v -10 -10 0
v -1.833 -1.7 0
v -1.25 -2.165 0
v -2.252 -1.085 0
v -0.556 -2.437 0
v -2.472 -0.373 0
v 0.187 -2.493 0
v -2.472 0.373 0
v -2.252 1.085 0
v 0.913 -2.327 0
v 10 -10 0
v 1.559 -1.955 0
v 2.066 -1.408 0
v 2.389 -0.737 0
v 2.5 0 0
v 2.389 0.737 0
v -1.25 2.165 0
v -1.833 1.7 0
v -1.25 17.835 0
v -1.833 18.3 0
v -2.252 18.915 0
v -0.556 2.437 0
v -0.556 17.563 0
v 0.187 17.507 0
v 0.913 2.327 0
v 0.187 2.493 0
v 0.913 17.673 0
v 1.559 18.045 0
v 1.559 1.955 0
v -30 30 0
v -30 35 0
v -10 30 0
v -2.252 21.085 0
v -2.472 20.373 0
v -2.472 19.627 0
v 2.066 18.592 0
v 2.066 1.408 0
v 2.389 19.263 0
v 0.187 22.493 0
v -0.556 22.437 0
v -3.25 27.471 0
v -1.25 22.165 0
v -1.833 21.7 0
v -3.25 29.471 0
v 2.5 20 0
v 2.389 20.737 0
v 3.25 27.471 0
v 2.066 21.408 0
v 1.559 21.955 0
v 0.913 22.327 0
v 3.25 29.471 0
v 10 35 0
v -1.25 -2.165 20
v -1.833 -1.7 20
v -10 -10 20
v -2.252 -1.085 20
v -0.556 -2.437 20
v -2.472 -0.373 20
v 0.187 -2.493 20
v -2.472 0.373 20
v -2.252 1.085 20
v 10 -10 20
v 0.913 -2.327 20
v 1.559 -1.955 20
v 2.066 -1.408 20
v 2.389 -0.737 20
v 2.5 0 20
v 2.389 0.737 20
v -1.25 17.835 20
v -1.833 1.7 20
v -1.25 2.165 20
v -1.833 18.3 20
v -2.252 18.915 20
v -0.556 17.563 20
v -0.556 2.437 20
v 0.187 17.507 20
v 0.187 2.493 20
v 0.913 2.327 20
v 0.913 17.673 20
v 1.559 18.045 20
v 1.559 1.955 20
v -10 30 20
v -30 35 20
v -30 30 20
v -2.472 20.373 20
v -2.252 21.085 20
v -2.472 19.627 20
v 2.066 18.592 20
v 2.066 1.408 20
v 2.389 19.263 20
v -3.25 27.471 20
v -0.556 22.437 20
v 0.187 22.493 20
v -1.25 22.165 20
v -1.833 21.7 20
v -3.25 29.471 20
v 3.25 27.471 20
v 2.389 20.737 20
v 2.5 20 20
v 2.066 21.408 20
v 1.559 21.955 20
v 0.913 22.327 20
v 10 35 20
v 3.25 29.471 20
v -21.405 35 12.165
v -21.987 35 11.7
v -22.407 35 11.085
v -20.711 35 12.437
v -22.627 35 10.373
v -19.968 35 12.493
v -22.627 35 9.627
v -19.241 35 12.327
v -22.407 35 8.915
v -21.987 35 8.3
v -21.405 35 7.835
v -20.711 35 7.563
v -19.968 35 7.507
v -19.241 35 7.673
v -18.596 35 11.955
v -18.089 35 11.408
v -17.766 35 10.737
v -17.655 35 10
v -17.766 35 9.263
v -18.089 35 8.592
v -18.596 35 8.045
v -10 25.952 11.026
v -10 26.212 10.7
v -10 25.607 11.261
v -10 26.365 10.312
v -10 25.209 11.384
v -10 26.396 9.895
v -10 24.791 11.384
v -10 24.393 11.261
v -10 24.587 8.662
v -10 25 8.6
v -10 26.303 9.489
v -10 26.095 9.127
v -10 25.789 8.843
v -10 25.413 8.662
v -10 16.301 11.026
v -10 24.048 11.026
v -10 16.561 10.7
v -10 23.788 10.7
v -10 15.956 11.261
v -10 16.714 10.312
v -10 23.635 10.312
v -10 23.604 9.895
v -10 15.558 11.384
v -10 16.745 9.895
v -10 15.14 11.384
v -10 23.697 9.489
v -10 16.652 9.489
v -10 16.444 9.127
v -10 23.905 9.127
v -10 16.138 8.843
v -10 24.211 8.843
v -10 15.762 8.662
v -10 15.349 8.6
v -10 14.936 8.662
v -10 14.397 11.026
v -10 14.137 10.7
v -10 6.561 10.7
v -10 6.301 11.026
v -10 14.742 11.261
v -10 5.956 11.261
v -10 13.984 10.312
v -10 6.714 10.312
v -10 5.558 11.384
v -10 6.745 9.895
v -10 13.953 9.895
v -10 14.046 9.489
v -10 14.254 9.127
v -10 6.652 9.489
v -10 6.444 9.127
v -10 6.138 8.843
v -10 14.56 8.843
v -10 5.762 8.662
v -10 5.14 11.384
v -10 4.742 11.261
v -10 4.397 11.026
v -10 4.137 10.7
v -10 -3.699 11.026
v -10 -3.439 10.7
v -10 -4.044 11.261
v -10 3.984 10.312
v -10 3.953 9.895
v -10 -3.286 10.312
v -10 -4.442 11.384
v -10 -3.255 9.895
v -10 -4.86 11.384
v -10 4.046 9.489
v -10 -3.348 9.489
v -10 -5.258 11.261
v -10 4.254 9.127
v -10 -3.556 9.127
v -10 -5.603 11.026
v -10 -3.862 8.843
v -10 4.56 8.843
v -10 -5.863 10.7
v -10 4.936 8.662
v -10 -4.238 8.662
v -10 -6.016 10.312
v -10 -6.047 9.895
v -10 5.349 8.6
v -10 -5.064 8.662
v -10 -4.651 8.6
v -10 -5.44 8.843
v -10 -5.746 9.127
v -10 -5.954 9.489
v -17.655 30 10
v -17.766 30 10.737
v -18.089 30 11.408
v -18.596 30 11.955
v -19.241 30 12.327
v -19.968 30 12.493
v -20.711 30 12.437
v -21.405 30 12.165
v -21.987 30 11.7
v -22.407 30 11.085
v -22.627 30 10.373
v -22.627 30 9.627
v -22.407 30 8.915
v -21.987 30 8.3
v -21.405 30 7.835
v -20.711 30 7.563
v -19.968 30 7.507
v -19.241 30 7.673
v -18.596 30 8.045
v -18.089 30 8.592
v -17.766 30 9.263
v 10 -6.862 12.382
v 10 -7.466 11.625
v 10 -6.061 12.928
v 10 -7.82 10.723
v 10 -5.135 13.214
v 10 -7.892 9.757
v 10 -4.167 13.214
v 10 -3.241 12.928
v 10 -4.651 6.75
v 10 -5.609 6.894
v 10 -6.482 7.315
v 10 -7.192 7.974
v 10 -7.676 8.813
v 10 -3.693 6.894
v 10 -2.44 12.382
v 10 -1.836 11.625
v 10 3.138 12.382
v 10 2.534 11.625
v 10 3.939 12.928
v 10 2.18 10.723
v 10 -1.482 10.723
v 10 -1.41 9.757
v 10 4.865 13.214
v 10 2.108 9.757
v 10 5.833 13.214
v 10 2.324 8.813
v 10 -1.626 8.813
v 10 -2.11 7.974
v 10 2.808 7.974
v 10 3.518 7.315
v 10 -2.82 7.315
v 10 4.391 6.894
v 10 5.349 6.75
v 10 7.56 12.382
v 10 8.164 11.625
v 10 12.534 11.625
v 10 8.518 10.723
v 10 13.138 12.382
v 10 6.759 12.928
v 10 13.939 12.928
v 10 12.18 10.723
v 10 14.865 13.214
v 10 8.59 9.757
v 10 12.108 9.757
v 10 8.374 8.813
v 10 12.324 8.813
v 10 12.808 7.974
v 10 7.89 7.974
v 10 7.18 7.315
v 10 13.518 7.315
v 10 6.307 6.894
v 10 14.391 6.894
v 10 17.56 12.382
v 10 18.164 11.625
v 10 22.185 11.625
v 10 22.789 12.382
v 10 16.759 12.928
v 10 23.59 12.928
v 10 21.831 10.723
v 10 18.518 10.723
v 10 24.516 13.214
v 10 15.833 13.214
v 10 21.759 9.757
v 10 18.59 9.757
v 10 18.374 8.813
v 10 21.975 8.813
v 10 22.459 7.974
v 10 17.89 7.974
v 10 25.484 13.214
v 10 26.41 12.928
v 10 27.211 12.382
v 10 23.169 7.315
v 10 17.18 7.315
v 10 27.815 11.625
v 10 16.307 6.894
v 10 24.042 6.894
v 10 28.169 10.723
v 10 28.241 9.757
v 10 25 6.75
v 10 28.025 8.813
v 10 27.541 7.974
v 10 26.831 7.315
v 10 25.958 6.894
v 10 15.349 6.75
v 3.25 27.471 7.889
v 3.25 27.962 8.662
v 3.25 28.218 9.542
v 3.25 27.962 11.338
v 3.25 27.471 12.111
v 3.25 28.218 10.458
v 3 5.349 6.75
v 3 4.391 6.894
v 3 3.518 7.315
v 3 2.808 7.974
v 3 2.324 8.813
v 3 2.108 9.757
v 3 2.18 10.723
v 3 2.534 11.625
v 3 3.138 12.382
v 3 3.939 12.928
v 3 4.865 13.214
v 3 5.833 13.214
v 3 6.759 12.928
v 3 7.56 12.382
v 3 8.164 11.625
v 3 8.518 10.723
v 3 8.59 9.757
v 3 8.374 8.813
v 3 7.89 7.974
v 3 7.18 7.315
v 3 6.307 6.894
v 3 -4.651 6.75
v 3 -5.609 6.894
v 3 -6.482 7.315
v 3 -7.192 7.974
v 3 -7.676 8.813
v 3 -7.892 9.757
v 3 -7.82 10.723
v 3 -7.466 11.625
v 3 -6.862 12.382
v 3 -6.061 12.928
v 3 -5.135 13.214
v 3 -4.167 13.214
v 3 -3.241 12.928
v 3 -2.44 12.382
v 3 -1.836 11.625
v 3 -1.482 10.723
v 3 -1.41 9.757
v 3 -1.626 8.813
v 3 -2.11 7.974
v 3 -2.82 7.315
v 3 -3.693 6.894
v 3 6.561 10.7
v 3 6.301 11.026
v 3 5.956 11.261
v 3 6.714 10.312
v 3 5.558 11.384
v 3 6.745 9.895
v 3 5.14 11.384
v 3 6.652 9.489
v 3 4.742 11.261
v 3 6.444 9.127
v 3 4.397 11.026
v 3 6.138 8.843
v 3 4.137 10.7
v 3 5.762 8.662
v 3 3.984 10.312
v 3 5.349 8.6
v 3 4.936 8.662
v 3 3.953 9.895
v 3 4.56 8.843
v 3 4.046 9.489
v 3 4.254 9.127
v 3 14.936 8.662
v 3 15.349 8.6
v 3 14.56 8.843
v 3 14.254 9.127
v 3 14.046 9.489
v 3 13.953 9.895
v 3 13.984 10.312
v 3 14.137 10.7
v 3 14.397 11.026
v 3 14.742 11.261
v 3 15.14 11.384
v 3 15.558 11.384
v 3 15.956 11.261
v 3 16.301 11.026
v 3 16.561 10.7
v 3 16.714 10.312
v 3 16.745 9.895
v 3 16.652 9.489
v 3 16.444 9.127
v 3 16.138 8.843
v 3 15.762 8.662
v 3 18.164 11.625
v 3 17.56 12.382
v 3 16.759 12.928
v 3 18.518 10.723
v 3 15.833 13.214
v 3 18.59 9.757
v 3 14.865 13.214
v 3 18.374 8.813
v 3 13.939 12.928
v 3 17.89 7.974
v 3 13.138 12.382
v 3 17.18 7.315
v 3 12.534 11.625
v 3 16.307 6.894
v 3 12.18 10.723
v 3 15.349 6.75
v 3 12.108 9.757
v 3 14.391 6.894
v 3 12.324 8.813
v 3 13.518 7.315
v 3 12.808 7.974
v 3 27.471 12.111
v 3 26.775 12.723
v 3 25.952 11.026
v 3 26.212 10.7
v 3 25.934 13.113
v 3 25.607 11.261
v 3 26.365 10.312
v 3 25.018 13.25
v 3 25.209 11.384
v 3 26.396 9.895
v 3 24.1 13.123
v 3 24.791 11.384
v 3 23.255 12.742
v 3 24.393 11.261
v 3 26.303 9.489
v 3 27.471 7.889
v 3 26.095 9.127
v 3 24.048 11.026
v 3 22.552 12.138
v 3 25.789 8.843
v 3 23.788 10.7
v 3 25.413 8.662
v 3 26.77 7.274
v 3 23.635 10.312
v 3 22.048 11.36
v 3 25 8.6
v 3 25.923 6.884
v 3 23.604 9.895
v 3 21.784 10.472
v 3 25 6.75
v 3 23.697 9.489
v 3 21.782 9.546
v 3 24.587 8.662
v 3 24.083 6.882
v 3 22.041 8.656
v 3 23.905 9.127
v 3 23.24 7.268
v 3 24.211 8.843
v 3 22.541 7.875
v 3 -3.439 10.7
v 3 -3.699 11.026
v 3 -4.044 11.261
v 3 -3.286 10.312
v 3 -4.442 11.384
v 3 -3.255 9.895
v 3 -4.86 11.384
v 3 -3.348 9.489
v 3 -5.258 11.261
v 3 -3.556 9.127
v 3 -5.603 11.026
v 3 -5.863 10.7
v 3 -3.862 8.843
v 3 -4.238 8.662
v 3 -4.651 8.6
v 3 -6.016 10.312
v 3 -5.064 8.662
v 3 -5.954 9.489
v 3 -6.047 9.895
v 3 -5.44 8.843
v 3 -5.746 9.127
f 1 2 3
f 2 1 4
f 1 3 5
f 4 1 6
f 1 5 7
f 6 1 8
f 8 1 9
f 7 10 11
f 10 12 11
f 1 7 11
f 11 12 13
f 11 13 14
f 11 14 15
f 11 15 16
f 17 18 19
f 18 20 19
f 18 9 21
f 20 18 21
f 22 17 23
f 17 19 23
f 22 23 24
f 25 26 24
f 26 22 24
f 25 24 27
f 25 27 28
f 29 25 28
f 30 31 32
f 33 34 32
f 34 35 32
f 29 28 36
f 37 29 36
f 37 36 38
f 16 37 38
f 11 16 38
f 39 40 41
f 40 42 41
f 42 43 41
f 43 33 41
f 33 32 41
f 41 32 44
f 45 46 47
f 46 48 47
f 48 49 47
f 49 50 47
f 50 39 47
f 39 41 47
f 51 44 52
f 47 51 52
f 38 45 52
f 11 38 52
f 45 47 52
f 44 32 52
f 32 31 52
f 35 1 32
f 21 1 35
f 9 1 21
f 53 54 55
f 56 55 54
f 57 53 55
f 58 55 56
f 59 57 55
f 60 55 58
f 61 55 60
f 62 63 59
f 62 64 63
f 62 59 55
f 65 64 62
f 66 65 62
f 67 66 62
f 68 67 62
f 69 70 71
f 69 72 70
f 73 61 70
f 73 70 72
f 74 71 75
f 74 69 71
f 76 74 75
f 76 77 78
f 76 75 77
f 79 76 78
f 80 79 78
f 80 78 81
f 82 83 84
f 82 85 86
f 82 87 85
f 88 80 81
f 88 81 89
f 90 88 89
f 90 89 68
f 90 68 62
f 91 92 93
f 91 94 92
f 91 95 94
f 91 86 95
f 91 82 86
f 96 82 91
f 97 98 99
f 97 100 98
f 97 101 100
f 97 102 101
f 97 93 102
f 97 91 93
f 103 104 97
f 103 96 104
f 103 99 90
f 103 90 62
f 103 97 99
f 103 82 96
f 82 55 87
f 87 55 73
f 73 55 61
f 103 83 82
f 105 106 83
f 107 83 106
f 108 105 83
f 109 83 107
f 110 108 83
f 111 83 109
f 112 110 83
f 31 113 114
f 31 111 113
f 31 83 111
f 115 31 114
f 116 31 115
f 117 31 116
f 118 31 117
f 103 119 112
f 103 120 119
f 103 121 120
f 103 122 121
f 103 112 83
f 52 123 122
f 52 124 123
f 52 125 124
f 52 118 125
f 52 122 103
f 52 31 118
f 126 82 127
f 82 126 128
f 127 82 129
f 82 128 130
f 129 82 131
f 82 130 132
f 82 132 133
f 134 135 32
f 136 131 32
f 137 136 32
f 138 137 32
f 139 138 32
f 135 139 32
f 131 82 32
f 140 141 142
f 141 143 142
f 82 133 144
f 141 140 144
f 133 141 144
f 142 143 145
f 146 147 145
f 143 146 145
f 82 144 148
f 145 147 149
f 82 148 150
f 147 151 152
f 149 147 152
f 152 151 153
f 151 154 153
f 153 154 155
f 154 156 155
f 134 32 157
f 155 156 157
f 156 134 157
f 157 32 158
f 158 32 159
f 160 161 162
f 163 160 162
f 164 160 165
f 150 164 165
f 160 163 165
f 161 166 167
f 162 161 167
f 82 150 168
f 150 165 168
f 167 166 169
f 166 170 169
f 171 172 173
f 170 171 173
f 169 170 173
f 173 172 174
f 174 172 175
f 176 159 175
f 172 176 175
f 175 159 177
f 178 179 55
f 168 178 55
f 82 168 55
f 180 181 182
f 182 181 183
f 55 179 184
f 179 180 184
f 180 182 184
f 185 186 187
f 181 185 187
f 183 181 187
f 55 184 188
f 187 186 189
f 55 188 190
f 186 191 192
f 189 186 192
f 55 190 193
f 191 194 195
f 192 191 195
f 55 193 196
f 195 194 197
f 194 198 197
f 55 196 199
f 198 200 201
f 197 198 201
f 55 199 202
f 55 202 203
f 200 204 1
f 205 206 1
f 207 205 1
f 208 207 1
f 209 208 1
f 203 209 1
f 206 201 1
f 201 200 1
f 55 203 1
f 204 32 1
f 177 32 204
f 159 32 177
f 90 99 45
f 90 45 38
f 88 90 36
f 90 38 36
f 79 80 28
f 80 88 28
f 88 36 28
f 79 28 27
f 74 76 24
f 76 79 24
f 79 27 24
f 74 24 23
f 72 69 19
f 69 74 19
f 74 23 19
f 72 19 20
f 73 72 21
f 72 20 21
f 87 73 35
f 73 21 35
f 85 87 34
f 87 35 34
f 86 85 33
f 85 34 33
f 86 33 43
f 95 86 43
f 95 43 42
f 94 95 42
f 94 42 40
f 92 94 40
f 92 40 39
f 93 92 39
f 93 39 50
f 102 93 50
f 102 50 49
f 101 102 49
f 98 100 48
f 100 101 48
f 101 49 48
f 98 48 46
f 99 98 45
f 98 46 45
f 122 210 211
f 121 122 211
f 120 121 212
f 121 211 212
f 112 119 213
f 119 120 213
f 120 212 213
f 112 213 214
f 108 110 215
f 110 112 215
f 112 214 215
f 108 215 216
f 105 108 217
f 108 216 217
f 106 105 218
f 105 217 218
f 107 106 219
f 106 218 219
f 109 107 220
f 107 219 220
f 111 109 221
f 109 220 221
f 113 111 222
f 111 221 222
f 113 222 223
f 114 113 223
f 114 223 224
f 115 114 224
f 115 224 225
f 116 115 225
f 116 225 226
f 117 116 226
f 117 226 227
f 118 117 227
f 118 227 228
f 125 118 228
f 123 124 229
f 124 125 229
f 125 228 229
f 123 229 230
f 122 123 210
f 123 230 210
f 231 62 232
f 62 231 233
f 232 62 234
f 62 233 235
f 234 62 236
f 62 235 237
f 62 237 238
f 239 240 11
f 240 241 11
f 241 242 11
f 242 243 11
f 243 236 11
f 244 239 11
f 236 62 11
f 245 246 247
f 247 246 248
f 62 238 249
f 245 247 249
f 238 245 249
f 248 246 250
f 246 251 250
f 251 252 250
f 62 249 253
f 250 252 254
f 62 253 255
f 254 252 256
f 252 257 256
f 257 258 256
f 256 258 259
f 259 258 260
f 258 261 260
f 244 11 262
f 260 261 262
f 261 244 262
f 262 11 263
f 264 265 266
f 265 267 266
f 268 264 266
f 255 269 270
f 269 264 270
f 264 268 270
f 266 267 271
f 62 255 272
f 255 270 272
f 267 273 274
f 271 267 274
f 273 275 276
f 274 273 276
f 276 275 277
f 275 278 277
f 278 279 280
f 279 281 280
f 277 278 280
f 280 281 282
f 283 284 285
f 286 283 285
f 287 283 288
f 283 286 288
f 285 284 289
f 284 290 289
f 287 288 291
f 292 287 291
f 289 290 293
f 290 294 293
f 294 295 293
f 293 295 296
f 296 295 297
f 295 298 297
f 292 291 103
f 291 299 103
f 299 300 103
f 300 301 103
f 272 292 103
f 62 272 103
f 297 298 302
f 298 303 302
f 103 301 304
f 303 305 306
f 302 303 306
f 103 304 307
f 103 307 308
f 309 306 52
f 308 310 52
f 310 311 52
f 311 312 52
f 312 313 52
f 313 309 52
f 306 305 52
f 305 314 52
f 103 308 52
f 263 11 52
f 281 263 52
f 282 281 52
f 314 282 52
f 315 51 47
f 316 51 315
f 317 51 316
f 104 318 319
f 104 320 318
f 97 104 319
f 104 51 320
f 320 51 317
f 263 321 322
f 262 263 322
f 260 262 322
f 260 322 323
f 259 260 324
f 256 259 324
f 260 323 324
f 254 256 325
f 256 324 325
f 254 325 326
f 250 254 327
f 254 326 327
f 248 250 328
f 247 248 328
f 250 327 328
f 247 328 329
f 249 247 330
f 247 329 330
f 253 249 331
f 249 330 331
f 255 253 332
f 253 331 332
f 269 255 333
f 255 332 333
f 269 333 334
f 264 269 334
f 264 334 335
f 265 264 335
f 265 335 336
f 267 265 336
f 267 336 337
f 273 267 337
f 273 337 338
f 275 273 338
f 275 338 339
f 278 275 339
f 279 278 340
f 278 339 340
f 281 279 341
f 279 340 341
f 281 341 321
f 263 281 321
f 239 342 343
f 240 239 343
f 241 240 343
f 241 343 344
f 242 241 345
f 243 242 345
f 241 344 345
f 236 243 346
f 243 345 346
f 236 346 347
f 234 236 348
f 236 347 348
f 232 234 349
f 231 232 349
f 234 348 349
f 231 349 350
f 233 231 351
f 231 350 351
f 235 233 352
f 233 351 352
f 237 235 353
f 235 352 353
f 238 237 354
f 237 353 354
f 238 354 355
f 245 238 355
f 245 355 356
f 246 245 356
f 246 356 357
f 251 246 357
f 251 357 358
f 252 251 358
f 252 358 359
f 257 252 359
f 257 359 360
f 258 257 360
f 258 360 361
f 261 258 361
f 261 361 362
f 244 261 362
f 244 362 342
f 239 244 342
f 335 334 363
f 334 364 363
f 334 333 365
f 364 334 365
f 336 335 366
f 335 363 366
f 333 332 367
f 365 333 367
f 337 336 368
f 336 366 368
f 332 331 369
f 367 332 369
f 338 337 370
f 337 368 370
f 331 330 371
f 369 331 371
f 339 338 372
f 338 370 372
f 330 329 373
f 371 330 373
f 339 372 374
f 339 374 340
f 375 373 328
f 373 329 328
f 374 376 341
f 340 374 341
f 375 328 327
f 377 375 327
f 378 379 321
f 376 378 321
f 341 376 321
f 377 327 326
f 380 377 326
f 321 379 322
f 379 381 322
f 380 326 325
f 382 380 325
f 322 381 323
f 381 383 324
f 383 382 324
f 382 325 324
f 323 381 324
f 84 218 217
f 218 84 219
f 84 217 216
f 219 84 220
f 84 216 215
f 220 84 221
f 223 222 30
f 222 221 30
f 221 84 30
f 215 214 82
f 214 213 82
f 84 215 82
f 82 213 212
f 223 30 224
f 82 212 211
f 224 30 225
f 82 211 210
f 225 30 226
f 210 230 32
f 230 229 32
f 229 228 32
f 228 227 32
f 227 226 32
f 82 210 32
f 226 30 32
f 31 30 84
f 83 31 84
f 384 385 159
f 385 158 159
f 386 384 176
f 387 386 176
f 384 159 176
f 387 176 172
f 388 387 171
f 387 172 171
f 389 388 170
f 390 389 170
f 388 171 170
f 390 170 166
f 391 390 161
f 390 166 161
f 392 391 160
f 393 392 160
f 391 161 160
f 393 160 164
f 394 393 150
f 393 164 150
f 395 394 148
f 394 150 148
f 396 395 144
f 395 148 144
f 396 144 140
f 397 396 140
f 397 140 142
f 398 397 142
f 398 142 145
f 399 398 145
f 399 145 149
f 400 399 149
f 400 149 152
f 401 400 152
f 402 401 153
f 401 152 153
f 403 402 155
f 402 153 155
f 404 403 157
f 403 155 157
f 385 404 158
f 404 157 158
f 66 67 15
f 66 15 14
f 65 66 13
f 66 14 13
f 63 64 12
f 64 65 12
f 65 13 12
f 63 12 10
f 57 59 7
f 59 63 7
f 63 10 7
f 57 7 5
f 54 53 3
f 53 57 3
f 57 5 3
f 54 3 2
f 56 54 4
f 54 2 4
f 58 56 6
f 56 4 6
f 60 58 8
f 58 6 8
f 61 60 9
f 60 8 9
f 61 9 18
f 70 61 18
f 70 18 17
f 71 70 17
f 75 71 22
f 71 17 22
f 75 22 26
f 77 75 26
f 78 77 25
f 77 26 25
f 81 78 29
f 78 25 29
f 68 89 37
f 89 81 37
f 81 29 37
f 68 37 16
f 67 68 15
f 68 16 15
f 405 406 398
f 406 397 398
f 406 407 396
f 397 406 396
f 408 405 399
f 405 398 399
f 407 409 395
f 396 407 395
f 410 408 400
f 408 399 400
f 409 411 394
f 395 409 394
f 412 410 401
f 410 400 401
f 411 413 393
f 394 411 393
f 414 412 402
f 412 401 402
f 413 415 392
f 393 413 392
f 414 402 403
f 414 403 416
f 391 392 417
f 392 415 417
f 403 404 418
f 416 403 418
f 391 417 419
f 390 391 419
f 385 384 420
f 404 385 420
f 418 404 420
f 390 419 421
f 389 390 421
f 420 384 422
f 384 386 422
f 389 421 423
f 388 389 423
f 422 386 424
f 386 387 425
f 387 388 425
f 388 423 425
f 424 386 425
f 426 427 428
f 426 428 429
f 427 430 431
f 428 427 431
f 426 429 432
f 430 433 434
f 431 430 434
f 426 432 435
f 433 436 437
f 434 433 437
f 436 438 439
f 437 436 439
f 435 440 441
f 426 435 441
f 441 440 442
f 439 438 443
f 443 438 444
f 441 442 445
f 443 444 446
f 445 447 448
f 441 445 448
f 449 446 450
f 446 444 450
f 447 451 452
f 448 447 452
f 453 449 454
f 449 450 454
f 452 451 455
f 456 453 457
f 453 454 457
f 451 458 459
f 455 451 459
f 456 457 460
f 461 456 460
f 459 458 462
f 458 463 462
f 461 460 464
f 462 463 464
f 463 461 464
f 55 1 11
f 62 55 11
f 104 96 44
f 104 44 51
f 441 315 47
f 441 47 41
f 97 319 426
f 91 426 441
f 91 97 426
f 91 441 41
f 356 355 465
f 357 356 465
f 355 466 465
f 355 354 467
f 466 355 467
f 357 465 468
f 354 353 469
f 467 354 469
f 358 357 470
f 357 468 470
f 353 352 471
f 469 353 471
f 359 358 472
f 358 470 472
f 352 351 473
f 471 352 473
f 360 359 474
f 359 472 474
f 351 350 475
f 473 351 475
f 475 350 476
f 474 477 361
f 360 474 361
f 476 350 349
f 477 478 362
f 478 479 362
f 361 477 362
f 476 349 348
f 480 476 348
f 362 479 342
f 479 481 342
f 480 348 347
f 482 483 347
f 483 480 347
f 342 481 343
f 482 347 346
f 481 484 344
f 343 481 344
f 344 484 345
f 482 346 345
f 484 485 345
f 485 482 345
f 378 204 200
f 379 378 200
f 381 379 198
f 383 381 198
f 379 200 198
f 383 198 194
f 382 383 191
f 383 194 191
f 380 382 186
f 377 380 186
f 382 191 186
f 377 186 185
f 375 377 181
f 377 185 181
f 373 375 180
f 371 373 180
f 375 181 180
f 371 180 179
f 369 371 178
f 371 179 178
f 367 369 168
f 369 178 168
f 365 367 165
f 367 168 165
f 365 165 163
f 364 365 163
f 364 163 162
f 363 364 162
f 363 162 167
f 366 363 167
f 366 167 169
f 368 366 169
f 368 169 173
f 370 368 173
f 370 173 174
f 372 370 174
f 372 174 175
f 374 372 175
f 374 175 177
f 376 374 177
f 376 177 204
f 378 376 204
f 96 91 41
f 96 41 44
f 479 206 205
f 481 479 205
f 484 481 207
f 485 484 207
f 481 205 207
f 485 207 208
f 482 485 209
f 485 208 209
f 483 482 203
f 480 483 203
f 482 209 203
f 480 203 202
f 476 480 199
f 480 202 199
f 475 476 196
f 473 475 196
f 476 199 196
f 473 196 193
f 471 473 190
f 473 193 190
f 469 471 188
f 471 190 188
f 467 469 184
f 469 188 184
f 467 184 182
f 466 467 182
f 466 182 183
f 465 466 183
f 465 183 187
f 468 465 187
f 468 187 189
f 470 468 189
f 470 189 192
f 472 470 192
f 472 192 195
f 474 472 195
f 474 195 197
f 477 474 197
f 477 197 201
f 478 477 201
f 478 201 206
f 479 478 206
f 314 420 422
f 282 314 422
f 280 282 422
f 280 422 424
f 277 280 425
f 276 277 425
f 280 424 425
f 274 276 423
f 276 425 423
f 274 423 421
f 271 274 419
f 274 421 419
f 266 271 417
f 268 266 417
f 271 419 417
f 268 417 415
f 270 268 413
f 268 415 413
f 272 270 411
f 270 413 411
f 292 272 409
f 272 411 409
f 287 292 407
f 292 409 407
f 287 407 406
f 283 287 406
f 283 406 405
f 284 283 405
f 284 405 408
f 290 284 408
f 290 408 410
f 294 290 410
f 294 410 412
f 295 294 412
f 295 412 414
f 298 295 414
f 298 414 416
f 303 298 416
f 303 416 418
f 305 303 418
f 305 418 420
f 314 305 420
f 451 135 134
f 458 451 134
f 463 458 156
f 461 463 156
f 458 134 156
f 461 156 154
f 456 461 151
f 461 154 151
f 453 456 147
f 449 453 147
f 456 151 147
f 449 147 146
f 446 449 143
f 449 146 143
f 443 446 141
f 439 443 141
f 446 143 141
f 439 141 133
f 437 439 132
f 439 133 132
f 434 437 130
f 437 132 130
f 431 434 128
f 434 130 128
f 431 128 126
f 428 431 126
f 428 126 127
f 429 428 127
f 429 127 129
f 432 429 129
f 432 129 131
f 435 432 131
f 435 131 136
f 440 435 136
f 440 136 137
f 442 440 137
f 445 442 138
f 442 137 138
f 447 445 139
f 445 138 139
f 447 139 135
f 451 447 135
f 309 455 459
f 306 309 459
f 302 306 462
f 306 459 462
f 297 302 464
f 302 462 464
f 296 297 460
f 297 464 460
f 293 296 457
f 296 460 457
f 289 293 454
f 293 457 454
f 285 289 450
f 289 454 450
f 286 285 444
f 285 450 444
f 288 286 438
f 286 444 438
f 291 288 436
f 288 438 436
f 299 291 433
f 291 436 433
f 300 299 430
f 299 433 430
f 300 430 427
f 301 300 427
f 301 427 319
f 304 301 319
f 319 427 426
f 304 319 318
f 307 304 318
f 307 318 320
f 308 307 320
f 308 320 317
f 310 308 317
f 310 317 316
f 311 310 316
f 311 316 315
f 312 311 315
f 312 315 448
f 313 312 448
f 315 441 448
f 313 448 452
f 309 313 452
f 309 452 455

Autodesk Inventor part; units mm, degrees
ref_plane "YZ Plane" through (0, 0, 0) normal (1, 0, 0) x (0, 1, 0)
ref_plane "XZ Plane" through (0, 0, 0) normal (0, 1, 0) x (-1, 0, 0)
ref_plane "Work Plane1" through (0, 0, 0) normal (0, 0, 1) x (1, 0, 0)
sketch "Sketch1" plane through (0, 0, 0) normal (0, 0, 1) x (1, 0, 0)
  circle A0 centre (0, 0) radius 2 construction
  circle A1 centre (0, 20) radius 2.5 construction
  line L0 (-10, 4) -> (-10, 16) construction
  line L1 (-10, 4) -> (-6, 4) construction
  line L2 (-6, 4) -> (-6, -4) construction
  line L3 (-6, -4) -> (-10, -4) construction
  line L4 (-10, -4) -> (-10, -10) construction
  line L5 (-10, -10) -> (-4, -10) construction
  line L6 (-4, -10) -> (-4, -6) construction
  line L7 (-4, -6) -> (4, -6) construction
  line L8 (4, -6) -> (4, -10) construction
  line L9 (4, -10) -> (10, -10) construction
  line L10 (10, -10) -> (10, -4) construction
  line L11 (10, -4) -> (6, -4) construction
  line L12 (6, -4) -> (6, 4) construction
  line L13 (6, 4) -> (10, 4) construction
  line L14 (10, 4) -> (10, 16) construction
  line L15 (6, 16) -> (10, 16) construction
  line L16 (6, 24) -> (6, 16) construction
  line L17 (10, 24) -> (6, 24) construction
  line L18 (10, 30) -> (10, 24) construction
  line L19 (4, 30) -> (10, 30) construction
  line L20 (4, 26) -> (4, 30) construction
  line L21 (-4, 26) -> (4, 26) construction
  line L22 (-4, 30) -> (-4, 26) construction
  line L23 (-10, 30) -> (-4, 30) construction
  line L24 (-10, 24) -> (-10, 30) construction
  line L25 (-6, 24) -> (-10, 24) construction
  line L26 (-6, 16) -> (-6, 24) construction
  line L27 (-10, 16) -> (-6, 16) construction
  line L28 (-4, 6) -> (-4, 14) construction
  line L29 (4, 14) -> (-4, 14) construction
  line L30 (4, 6) -> (4, 14) construction
  line L31 (4, 6) -> (-4, 6) construction
  line L32 (10, 30) -> (-10, 30)
  line L33 (-10, 30) -> (-10, -10)
  line L34 (-10, -10) -> (10, -10)
  line L35 (10, -10) -> (10, 30)
  circle A2 centre (0, 20) radius 2.5
  circle A3 centre (0, 0) radius 2.5
  point P0 (0, 0)
  dimension "d0" = 40
  dimension "d1" = 5
ref_plane "Work Plane2" through (-30, -220, 20) normal (0, 0, 1) x (1, 0, 0)
extrude "Extrusion1" add sketch "Sketch1" along normal up to surface (20 mm away)
sketch "Sketch2" plane through (10, -10, 0) normal (1, 0, 0) x (0, 0, -1)
  line L0 (-20, 40) -> (-20, 0) projected
  line L1 (0, 0) -> (-20, 0) projected
  line L2 (0, 0) -> (0, 40) projected
  line L3 (0, 40) -> (-20, 40) projected
  line L4 (-14, 40) -> (-14, -210) projected
  line L5 (-6, 40) -> (-6, -210) projected
  line L6 (-20, 32.5) -> (-20, 27.5) projected
  line L7 (0, 32.5) -> (0, 27.5) projected
  line L8 (-20, 12.5) -> (-20, 7.5) projected
  line L9 (0, 12.5) -> (-20, 12.5) projected
  line L10 (0, 7.5) -> (-20, 7.5) projected
  line L11 (0, 32.5) -> (-20, 32.5) projected
  line L12 (0, 27.5) -> (-20, 27.5) projected
  circle A0 centre (-10, 45) radius 1.4
  circle A1 centre (-10, 25.349) radius 1.4
  circle A2 centre (-10, 15.349) radius 1.4
  circle A3 centre (-10, 35) radius 1.4
  circle A4 centre (-10, 5.349) radius 1.4
  point P0 (0, 10)
  point P1 (-9.8573, 5.349)
  dimension "d5" = 2.8
  dimension "d8" = 10
  dimension "d13" = 2.8
  dimension "d14" = 10
hole "Hole1" at (10, 25, 10) at (10, 5.349, 10) at (10, -4.651, 10) at (10, 15.349, 10) direction (-1, 0, 0) diameter 2.8 end through all counterbore diameter 6.5 counterbore depth 7
sketch "Sketch3" plane through (-10, 30, 0) normal (0, 1, 0) x (1, 0, 0)
  line L0 (0, -20) -> (20, -20) projected
  line L1 (20, 0) -> (20, -20) projected
  line L2 (20, 0) -> (0, 0) projected
  line L3 (0, 0) -> (0, -20) projected
  line L4 (20, 0) -> (0, 0) projected
  line L5 (20, 0) -> (-20, 0)
  line L6 (-20, 0) -> (-20, -20)
  line L7 (-20, -20) -> (20, -20)
  line L8 (20, -20) -> (20, 0)
  circle A0 centre (-10.1547, -10) radius 2.5
  point P0 (10, 0)
  dimension "d22" = 40
  dimension "d23" = 5
extrude "Extrusion2" add sketch "Sketch3" along normal blind 5
sketch "Sketch5" plane through (-10, -10, 20) normal (0, 0, 1) x (1, 0, 0)
  line L0 (6.75, 39.4711) -> (13.25, 39.4711)
  line L1 (13.25, 39.4711) -> (13.25, 37.4711)
  line L2 (13.25, 37.4711) -> (6.75, 37.4711)
  line L3 (6.75, 37.4711) -> (6.75, 39.4711)
  line L4 (6.75, 39.4711) -> (13.25, 37.4711) construction
  line L5 (13.25, 39.4711) -> (6.75, 37.4711) construction
  point P0 (10, 10)
  point P1 (10, 38.4711)
  dimension "d33" = 6.5
  dimension "d34" = 2
extrude "Extrusion3" cut sketch "Sketch5" against normal through all
properties part number "Neje_20mm_rod_connector_double"
